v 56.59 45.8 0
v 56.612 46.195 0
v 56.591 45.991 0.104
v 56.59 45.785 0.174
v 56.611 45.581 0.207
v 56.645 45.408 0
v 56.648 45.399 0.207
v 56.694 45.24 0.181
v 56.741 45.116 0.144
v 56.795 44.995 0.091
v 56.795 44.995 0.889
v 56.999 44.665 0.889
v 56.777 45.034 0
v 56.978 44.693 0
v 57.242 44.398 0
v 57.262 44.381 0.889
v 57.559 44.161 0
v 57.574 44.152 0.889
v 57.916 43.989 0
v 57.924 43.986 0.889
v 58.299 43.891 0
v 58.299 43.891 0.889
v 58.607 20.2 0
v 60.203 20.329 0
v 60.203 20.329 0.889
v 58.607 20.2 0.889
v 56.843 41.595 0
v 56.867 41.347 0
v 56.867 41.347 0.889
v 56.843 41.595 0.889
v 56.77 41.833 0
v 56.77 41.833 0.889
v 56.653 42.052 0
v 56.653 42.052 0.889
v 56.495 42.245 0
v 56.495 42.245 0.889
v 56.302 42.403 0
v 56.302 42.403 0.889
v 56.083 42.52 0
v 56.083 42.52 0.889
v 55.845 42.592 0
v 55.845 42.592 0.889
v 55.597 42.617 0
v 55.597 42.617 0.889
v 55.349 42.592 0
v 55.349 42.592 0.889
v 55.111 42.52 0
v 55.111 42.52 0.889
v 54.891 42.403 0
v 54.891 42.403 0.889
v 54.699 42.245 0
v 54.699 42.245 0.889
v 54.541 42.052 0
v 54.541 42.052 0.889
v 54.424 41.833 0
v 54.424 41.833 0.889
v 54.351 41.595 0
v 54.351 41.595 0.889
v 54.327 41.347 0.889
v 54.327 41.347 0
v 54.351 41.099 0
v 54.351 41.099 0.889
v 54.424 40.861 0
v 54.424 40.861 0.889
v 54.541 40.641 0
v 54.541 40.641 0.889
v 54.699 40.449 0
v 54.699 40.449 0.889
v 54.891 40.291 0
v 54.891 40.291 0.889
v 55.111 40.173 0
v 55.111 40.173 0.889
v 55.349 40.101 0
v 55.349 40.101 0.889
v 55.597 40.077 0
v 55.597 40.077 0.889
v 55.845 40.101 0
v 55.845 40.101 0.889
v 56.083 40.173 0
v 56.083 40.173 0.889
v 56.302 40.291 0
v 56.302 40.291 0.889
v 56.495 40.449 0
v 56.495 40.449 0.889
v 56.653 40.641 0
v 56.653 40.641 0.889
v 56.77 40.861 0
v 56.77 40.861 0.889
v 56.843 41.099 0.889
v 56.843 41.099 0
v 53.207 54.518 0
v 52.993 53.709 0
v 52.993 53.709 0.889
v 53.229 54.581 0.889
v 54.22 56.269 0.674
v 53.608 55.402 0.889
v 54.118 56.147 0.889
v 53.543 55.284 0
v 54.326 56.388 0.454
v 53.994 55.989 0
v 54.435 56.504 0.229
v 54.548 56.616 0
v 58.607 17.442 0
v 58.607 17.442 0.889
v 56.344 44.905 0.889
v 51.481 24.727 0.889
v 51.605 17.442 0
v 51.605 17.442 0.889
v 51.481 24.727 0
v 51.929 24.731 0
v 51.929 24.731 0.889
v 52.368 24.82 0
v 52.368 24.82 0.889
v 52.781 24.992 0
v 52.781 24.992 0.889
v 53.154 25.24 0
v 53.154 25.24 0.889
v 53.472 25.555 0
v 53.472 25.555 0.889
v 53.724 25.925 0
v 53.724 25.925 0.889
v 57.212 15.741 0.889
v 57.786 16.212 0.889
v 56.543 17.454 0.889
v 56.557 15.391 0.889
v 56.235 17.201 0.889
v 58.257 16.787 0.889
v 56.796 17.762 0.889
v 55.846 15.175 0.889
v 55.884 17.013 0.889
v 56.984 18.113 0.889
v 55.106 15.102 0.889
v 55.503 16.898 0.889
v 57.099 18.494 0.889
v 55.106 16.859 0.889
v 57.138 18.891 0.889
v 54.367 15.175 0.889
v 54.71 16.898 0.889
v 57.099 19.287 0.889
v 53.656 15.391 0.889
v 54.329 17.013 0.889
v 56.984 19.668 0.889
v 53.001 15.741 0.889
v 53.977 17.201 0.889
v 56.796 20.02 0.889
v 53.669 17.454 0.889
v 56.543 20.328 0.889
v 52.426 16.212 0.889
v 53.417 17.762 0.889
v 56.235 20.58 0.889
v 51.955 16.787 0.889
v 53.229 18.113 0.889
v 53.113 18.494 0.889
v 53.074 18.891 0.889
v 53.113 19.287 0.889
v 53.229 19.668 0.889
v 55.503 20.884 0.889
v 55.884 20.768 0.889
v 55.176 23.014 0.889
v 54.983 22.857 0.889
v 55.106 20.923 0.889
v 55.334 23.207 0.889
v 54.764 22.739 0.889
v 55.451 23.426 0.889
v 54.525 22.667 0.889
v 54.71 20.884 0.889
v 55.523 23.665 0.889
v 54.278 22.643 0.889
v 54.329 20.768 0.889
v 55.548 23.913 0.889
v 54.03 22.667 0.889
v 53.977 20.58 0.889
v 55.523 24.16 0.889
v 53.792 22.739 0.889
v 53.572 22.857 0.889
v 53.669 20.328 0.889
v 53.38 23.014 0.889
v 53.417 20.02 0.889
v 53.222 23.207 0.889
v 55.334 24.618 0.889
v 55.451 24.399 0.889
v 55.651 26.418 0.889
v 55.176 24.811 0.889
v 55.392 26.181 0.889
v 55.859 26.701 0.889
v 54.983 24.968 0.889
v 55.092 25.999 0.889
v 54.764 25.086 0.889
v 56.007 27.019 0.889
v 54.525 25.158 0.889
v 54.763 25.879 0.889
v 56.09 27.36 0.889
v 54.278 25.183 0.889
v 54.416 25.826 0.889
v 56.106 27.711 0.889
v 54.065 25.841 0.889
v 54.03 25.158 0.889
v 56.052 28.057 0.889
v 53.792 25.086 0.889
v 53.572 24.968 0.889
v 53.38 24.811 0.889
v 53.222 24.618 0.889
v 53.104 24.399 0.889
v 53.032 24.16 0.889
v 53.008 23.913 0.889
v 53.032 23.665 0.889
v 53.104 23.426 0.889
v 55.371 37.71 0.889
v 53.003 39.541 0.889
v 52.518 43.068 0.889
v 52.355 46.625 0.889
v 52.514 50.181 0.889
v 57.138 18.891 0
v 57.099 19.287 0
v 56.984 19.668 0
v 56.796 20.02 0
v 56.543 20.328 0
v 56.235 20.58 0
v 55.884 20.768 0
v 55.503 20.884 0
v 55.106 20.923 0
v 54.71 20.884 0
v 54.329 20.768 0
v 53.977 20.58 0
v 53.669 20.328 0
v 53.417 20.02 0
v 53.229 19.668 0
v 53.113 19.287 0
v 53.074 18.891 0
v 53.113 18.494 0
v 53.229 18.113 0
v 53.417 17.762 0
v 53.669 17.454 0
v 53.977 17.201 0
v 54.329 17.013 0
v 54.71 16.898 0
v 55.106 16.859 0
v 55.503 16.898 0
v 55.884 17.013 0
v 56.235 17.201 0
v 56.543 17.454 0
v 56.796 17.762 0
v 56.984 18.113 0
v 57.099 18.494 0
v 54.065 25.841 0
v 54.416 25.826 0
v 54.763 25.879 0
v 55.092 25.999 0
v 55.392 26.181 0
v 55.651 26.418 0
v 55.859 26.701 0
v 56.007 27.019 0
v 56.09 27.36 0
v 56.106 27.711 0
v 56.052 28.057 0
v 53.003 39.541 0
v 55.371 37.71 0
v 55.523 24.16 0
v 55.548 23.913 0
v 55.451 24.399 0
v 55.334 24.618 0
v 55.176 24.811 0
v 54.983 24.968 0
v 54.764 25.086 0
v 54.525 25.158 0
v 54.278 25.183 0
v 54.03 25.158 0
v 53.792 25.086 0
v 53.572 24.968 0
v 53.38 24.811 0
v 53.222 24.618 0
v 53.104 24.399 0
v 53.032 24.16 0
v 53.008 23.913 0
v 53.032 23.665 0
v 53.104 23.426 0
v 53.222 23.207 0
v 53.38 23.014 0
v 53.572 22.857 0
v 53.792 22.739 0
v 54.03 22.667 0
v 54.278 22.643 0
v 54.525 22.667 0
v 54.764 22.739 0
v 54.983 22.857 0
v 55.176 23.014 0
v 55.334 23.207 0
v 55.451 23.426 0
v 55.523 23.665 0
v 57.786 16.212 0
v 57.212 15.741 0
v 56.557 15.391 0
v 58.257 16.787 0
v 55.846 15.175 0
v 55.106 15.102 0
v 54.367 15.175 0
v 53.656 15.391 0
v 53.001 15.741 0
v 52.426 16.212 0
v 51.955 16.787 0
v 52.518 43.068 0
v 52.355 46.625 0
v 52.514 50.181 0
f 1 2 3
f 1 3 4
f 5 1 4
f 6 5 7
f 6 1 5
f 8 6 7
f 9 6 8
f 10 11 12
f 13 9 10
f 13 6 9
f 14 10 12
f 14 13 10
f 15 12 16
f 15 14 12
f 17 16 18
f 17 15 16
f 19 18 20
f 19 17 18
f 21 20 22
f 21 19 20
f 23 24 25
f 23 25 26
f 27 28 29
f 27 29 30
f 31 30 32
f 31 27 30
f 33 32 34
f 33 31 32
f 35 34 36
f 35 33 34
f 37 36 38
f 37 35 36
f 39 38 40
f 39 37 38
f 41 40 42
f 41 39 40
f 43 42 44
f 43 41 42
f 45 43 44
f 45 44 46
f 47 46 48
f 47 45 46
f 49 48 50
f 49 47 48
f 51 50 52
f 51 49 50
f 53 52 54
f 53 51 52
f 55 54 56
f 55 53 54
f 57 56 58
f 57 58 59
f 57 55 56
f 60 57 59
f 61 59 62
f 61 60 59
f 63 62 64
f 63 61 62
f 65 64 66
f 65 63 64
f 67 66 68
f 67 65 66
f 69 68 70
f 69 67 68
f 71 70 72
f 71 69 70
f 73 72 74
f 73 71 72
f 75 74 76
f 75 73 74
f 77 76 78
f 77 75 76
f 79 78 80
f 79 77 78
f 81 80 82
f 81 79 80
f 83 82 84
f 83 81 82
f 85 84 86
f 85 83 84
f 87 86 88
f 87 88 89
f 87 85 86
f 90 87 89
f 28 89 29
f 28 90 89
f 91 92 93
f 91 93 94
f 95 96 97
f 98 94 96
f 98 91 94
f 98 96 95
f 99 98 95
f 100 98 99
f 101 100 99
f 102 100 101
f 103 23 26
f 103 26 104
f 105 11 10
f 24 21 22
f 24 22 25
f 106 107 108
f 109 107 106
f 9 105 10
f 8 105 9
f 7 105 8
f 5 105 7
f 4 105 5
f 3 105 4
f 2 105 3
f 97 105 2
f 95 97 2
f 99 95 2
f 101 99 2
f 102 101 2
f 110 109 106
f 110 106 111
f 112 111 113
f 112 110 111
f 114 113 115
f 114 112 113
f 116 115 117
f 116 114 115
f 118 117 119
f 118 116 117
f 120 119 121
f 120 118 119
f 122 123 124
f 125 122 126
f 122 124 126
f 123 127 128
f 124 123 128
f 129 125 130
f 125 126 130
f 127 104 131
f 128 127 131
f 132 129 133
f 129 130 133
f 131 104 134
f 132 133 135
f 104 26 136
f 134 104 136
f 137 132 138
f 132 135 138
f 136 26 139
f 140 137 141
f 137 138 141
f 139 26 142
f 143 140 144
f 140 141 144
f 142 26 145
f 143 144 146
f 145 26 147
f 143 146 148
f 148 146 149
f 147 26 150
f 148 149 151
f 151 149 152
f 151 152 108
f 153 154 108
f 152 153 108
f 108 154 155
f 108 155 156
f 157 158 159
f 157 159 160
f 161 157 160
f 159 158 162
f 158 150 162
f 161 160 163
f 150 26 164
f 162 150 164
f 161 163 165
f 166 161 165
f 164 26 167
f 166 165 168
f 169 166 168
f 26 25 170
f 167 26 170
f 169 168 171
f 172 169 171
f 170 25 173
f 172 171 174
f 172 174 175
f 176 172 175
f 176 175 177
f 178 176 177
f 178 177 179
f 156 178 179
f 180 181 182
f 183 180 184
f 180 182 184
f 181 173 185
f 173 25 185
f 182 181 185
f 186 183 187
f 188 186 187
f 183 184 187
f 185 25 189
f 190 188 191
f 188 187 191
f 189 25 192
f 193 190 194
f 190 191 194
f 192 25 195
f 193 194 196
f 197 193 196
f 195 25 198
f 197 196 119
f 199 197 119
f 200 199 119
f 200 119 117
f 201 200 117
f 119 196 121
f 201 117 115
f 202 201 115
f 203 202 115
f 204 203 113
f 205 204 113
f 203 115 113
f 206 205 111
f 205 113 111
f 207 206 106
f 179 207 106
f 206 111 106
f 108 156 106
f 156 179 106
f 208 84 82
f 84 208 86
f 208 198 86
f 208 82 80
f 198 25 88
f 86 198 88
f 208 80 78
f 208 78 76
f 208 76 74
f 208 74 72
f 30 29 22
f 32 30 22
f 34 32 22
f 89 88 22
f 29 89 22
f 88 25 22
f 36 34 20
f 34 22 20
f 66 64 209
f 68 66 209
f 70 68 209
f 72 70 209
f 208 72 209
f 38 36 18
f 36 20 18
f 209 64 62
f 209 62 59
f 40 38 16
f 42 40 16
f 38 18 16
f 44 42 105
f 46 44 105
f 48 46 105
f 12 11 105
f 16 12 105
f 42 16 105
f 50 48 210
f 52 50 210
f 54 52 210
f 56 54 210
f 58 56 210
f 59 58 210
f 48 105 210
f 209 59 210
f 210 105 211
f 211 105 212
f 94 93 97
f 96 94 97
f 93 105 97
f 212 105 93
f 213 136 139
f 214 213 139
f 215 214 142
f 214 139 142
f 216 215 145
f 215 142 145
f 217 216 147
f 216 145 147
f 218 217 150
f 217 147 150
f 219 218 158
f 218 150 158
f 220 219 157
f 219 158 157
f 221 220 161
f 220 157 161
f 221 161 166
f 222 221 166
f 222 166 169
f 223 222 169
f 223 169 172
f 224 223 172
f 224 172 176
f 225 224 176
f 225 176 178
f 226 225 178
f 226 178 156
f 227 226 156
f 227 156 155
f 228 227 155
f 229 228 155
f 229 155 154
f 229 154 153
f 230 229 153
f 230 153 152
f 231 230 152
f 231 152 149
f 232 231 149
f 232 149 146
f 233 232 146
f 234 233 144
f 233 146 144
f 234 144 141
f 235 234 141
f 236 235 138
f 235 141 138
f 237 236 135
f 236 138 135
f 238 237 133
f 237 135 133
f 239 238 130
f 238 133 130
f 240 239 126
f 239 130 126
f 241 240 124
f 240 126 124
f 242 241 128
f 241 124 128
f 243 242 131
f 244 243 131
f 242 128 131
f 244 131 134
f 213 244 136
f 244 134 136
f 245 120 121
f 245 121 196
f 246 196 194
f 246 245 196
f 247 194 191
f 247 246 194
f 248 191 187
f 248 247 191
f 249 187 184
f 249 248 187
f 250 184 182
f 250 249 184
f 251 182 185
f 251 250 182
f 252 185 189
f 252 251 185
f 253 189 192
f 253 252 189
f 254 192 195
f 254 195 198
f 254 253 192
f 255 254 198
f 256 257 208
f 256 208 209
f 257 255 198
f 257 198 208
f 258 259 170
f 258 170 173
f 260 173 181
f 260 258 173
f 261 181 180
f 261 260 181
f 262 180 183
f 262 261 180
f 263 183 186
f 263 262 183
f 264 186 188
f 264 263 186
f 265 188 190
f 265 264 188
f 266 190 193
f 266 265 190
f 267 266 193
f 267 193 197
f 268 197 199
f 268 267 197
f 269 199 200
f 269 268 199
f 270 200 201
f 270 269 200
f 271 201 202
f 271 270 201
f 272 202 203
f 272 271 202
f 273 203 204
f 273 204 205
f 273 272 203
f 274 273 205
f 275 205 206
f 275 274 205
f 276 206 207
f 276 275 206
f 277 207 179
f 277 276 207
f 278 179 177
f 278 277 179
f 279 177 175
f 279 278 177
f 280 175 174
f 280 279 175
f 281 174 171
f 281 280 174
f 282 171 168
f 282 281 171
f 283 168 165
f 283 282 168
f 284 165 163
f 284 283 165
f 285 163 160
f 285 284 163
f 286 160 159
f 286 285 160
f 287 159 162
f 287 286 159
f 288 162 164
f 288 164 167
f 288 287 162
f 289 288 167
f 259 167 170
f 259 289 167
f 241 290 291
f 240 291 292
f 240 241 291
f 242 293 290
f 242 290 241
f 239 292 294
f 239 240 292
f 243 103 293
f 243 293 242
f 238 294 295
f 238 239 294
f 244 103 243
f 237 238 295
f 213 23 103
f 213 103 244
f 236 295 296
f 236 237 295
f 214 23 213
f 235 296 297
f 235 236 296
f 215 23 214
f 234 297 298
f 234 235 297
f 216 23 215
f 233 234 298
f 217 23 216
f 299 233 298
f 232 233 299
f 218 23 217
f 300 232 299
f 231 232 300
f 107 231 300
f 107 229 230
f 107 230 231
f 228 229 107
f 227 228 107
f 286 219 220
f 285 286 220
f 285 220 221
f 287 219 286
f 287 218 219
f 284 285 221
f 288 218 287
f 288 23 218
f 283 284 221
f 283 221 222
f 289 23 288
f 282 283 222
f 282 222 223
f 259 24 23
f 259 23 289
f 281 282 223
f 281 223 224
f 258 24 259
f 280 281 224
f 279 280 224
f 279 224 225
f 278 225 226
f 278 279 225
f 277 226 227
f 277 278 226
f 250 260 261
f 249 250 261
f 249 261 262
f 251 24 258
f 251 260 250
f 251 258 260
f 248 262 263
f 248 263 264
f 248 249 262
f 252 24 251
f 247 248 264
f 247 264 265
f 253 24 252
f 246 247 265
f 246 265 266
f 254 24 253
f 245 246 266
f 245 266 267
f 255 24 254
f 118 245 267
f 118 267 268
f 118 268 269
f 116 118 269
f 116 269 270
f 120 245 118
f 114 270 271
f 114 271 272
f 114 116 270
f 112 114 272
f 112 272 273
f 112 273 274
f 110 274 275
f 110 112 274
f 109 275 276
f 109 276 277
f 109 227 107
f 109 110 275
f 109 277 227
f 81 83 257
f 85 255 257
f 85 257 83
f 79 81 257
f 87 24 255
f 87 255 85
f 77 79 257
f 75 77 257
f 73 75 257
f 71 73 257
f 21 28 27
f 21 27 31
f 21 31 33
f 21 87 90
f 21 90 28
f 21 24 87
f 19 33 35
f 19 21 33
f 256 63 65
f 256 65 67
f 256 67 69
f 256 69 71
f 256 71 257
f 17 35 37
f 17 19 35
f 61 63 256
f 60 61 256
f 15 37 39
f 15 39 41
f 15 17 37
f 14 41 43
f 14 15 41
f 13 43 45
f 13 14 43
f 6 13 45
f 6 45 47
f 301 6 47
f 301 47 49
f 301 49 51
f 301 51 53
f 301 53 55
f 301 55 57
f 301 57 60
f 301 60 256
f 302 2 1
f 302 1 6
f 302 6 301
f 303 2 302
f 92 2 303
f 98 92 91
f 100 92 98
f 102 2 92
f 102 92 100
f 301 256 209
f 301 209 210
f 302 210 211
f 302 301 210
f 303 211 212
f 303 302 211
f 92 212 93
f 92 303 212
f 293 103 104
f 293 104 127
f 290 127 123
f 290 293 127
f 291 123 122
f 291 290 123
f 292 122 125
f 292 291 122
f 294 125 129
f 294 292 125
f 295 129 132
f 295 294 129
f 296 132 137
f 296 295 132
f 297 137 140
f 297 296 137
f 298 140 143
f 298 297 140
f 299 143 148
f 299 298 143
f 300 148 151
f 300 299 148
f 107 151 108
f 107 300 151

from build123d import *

# Parameters (mm, degrees)
SKETCH1_R           = 1.27
BOSS_EXTRUDE3_DEPTH = 0.889
SKETCH3_R           = 2.032
CUT_EXTRUDE1_DEPTH  = 1.889
CUT_EXTRUDE2_DEPTH  = 12.7


with BuildPart() as part:
    # Sketch1 → Boss-Extrude3 (new body)
    with BuildSketch(Plane.XY):
        with BuildLine():
            Line((54.54799083, 56.616289575), (56.611609417, 46.195015712))
            ThreePointArc((56.611609417, 46.195015712), (56.978037984, 44.693364942), (58.298969551, 43.890641624))
            Line((58.298969551, 43.890641624), (60.203091121, 20.328922191))
            Line((60.203091121, 20.328922191), (58.607476528, 20.19997387))
            Line((58.607476528, 20.19997387), (58.607476528, 17.442451046))
            ThreePointArc((58.607476528, 17.442451046), (55.106284247, 15.101864773), (51.605091967, 17.442451046))
            Line((51.605091967, 17.442451046), (51.481381748, 24.727035664))
            ThreePointArc((51.481381748, 24.727035664), (52.781095987, 24.992110323), (53.724469669, 25.924616503))
            ThreePointArc((53.724469669, 25.924616503), (55.527536206, 26.293339608), (56.052311948, 28.057316955))
            Line((56.052311948, 28.057316955), (55.371384499, 37.710464906))
            Line((55.371384499, 37.710464906), (53.003003997, 39.540899235))
            ThreePointArc((53.003003997, 39.540899235), (52.354767278, 46.624659681), (52.993412204, 53.709291327))
            ThreePointArc((52.993412204, 53.709291327), (53.543144587, 55.284481319), (54.54799083, 56.616289575))
        make_face()
        with Locations((55.596905374, 41.346801264)):
            Circle(SKETCH1_R, mode=Mode.SUBTRACT)
        with Locations((54.27760068, 23.912500713)):
            Circle(SKETCH1_R, mode=Mode.SUBTRACT)
    extrude(amount=BOSS_EXTRUDE3_DEPTH)

    # Sketch3 → Cut-Extrude1 (cut, through all)
    with BuildSketch(Plane.XY.offset(0.889)):
        with Locations((55.106284247, 18.890806819)):
            Circle(SKETCH3_R)
    extrude(amount=-CUT_EXTRUDE1_DEPTH, mode=Mode.SUBTRACT)

    # Sketch4 → Cut-Extrude2 (cut)
    with BuildSketch(Plane(origin=(-8.897590356, 44.932831299, 0), x_dir=(0.980952451, 0.19424801, 0), z_dir=(-0.19424801, 0.980952451, 0))):
        Polygon((64.506586873, 0), (64.506586873, -0.889), (63.993322484, -0.889), align=None)
    extrude(amount=-CUT_EXTRUDE2_DEPTH, mode=Mode.SUBTRACT)


solid = part.part
